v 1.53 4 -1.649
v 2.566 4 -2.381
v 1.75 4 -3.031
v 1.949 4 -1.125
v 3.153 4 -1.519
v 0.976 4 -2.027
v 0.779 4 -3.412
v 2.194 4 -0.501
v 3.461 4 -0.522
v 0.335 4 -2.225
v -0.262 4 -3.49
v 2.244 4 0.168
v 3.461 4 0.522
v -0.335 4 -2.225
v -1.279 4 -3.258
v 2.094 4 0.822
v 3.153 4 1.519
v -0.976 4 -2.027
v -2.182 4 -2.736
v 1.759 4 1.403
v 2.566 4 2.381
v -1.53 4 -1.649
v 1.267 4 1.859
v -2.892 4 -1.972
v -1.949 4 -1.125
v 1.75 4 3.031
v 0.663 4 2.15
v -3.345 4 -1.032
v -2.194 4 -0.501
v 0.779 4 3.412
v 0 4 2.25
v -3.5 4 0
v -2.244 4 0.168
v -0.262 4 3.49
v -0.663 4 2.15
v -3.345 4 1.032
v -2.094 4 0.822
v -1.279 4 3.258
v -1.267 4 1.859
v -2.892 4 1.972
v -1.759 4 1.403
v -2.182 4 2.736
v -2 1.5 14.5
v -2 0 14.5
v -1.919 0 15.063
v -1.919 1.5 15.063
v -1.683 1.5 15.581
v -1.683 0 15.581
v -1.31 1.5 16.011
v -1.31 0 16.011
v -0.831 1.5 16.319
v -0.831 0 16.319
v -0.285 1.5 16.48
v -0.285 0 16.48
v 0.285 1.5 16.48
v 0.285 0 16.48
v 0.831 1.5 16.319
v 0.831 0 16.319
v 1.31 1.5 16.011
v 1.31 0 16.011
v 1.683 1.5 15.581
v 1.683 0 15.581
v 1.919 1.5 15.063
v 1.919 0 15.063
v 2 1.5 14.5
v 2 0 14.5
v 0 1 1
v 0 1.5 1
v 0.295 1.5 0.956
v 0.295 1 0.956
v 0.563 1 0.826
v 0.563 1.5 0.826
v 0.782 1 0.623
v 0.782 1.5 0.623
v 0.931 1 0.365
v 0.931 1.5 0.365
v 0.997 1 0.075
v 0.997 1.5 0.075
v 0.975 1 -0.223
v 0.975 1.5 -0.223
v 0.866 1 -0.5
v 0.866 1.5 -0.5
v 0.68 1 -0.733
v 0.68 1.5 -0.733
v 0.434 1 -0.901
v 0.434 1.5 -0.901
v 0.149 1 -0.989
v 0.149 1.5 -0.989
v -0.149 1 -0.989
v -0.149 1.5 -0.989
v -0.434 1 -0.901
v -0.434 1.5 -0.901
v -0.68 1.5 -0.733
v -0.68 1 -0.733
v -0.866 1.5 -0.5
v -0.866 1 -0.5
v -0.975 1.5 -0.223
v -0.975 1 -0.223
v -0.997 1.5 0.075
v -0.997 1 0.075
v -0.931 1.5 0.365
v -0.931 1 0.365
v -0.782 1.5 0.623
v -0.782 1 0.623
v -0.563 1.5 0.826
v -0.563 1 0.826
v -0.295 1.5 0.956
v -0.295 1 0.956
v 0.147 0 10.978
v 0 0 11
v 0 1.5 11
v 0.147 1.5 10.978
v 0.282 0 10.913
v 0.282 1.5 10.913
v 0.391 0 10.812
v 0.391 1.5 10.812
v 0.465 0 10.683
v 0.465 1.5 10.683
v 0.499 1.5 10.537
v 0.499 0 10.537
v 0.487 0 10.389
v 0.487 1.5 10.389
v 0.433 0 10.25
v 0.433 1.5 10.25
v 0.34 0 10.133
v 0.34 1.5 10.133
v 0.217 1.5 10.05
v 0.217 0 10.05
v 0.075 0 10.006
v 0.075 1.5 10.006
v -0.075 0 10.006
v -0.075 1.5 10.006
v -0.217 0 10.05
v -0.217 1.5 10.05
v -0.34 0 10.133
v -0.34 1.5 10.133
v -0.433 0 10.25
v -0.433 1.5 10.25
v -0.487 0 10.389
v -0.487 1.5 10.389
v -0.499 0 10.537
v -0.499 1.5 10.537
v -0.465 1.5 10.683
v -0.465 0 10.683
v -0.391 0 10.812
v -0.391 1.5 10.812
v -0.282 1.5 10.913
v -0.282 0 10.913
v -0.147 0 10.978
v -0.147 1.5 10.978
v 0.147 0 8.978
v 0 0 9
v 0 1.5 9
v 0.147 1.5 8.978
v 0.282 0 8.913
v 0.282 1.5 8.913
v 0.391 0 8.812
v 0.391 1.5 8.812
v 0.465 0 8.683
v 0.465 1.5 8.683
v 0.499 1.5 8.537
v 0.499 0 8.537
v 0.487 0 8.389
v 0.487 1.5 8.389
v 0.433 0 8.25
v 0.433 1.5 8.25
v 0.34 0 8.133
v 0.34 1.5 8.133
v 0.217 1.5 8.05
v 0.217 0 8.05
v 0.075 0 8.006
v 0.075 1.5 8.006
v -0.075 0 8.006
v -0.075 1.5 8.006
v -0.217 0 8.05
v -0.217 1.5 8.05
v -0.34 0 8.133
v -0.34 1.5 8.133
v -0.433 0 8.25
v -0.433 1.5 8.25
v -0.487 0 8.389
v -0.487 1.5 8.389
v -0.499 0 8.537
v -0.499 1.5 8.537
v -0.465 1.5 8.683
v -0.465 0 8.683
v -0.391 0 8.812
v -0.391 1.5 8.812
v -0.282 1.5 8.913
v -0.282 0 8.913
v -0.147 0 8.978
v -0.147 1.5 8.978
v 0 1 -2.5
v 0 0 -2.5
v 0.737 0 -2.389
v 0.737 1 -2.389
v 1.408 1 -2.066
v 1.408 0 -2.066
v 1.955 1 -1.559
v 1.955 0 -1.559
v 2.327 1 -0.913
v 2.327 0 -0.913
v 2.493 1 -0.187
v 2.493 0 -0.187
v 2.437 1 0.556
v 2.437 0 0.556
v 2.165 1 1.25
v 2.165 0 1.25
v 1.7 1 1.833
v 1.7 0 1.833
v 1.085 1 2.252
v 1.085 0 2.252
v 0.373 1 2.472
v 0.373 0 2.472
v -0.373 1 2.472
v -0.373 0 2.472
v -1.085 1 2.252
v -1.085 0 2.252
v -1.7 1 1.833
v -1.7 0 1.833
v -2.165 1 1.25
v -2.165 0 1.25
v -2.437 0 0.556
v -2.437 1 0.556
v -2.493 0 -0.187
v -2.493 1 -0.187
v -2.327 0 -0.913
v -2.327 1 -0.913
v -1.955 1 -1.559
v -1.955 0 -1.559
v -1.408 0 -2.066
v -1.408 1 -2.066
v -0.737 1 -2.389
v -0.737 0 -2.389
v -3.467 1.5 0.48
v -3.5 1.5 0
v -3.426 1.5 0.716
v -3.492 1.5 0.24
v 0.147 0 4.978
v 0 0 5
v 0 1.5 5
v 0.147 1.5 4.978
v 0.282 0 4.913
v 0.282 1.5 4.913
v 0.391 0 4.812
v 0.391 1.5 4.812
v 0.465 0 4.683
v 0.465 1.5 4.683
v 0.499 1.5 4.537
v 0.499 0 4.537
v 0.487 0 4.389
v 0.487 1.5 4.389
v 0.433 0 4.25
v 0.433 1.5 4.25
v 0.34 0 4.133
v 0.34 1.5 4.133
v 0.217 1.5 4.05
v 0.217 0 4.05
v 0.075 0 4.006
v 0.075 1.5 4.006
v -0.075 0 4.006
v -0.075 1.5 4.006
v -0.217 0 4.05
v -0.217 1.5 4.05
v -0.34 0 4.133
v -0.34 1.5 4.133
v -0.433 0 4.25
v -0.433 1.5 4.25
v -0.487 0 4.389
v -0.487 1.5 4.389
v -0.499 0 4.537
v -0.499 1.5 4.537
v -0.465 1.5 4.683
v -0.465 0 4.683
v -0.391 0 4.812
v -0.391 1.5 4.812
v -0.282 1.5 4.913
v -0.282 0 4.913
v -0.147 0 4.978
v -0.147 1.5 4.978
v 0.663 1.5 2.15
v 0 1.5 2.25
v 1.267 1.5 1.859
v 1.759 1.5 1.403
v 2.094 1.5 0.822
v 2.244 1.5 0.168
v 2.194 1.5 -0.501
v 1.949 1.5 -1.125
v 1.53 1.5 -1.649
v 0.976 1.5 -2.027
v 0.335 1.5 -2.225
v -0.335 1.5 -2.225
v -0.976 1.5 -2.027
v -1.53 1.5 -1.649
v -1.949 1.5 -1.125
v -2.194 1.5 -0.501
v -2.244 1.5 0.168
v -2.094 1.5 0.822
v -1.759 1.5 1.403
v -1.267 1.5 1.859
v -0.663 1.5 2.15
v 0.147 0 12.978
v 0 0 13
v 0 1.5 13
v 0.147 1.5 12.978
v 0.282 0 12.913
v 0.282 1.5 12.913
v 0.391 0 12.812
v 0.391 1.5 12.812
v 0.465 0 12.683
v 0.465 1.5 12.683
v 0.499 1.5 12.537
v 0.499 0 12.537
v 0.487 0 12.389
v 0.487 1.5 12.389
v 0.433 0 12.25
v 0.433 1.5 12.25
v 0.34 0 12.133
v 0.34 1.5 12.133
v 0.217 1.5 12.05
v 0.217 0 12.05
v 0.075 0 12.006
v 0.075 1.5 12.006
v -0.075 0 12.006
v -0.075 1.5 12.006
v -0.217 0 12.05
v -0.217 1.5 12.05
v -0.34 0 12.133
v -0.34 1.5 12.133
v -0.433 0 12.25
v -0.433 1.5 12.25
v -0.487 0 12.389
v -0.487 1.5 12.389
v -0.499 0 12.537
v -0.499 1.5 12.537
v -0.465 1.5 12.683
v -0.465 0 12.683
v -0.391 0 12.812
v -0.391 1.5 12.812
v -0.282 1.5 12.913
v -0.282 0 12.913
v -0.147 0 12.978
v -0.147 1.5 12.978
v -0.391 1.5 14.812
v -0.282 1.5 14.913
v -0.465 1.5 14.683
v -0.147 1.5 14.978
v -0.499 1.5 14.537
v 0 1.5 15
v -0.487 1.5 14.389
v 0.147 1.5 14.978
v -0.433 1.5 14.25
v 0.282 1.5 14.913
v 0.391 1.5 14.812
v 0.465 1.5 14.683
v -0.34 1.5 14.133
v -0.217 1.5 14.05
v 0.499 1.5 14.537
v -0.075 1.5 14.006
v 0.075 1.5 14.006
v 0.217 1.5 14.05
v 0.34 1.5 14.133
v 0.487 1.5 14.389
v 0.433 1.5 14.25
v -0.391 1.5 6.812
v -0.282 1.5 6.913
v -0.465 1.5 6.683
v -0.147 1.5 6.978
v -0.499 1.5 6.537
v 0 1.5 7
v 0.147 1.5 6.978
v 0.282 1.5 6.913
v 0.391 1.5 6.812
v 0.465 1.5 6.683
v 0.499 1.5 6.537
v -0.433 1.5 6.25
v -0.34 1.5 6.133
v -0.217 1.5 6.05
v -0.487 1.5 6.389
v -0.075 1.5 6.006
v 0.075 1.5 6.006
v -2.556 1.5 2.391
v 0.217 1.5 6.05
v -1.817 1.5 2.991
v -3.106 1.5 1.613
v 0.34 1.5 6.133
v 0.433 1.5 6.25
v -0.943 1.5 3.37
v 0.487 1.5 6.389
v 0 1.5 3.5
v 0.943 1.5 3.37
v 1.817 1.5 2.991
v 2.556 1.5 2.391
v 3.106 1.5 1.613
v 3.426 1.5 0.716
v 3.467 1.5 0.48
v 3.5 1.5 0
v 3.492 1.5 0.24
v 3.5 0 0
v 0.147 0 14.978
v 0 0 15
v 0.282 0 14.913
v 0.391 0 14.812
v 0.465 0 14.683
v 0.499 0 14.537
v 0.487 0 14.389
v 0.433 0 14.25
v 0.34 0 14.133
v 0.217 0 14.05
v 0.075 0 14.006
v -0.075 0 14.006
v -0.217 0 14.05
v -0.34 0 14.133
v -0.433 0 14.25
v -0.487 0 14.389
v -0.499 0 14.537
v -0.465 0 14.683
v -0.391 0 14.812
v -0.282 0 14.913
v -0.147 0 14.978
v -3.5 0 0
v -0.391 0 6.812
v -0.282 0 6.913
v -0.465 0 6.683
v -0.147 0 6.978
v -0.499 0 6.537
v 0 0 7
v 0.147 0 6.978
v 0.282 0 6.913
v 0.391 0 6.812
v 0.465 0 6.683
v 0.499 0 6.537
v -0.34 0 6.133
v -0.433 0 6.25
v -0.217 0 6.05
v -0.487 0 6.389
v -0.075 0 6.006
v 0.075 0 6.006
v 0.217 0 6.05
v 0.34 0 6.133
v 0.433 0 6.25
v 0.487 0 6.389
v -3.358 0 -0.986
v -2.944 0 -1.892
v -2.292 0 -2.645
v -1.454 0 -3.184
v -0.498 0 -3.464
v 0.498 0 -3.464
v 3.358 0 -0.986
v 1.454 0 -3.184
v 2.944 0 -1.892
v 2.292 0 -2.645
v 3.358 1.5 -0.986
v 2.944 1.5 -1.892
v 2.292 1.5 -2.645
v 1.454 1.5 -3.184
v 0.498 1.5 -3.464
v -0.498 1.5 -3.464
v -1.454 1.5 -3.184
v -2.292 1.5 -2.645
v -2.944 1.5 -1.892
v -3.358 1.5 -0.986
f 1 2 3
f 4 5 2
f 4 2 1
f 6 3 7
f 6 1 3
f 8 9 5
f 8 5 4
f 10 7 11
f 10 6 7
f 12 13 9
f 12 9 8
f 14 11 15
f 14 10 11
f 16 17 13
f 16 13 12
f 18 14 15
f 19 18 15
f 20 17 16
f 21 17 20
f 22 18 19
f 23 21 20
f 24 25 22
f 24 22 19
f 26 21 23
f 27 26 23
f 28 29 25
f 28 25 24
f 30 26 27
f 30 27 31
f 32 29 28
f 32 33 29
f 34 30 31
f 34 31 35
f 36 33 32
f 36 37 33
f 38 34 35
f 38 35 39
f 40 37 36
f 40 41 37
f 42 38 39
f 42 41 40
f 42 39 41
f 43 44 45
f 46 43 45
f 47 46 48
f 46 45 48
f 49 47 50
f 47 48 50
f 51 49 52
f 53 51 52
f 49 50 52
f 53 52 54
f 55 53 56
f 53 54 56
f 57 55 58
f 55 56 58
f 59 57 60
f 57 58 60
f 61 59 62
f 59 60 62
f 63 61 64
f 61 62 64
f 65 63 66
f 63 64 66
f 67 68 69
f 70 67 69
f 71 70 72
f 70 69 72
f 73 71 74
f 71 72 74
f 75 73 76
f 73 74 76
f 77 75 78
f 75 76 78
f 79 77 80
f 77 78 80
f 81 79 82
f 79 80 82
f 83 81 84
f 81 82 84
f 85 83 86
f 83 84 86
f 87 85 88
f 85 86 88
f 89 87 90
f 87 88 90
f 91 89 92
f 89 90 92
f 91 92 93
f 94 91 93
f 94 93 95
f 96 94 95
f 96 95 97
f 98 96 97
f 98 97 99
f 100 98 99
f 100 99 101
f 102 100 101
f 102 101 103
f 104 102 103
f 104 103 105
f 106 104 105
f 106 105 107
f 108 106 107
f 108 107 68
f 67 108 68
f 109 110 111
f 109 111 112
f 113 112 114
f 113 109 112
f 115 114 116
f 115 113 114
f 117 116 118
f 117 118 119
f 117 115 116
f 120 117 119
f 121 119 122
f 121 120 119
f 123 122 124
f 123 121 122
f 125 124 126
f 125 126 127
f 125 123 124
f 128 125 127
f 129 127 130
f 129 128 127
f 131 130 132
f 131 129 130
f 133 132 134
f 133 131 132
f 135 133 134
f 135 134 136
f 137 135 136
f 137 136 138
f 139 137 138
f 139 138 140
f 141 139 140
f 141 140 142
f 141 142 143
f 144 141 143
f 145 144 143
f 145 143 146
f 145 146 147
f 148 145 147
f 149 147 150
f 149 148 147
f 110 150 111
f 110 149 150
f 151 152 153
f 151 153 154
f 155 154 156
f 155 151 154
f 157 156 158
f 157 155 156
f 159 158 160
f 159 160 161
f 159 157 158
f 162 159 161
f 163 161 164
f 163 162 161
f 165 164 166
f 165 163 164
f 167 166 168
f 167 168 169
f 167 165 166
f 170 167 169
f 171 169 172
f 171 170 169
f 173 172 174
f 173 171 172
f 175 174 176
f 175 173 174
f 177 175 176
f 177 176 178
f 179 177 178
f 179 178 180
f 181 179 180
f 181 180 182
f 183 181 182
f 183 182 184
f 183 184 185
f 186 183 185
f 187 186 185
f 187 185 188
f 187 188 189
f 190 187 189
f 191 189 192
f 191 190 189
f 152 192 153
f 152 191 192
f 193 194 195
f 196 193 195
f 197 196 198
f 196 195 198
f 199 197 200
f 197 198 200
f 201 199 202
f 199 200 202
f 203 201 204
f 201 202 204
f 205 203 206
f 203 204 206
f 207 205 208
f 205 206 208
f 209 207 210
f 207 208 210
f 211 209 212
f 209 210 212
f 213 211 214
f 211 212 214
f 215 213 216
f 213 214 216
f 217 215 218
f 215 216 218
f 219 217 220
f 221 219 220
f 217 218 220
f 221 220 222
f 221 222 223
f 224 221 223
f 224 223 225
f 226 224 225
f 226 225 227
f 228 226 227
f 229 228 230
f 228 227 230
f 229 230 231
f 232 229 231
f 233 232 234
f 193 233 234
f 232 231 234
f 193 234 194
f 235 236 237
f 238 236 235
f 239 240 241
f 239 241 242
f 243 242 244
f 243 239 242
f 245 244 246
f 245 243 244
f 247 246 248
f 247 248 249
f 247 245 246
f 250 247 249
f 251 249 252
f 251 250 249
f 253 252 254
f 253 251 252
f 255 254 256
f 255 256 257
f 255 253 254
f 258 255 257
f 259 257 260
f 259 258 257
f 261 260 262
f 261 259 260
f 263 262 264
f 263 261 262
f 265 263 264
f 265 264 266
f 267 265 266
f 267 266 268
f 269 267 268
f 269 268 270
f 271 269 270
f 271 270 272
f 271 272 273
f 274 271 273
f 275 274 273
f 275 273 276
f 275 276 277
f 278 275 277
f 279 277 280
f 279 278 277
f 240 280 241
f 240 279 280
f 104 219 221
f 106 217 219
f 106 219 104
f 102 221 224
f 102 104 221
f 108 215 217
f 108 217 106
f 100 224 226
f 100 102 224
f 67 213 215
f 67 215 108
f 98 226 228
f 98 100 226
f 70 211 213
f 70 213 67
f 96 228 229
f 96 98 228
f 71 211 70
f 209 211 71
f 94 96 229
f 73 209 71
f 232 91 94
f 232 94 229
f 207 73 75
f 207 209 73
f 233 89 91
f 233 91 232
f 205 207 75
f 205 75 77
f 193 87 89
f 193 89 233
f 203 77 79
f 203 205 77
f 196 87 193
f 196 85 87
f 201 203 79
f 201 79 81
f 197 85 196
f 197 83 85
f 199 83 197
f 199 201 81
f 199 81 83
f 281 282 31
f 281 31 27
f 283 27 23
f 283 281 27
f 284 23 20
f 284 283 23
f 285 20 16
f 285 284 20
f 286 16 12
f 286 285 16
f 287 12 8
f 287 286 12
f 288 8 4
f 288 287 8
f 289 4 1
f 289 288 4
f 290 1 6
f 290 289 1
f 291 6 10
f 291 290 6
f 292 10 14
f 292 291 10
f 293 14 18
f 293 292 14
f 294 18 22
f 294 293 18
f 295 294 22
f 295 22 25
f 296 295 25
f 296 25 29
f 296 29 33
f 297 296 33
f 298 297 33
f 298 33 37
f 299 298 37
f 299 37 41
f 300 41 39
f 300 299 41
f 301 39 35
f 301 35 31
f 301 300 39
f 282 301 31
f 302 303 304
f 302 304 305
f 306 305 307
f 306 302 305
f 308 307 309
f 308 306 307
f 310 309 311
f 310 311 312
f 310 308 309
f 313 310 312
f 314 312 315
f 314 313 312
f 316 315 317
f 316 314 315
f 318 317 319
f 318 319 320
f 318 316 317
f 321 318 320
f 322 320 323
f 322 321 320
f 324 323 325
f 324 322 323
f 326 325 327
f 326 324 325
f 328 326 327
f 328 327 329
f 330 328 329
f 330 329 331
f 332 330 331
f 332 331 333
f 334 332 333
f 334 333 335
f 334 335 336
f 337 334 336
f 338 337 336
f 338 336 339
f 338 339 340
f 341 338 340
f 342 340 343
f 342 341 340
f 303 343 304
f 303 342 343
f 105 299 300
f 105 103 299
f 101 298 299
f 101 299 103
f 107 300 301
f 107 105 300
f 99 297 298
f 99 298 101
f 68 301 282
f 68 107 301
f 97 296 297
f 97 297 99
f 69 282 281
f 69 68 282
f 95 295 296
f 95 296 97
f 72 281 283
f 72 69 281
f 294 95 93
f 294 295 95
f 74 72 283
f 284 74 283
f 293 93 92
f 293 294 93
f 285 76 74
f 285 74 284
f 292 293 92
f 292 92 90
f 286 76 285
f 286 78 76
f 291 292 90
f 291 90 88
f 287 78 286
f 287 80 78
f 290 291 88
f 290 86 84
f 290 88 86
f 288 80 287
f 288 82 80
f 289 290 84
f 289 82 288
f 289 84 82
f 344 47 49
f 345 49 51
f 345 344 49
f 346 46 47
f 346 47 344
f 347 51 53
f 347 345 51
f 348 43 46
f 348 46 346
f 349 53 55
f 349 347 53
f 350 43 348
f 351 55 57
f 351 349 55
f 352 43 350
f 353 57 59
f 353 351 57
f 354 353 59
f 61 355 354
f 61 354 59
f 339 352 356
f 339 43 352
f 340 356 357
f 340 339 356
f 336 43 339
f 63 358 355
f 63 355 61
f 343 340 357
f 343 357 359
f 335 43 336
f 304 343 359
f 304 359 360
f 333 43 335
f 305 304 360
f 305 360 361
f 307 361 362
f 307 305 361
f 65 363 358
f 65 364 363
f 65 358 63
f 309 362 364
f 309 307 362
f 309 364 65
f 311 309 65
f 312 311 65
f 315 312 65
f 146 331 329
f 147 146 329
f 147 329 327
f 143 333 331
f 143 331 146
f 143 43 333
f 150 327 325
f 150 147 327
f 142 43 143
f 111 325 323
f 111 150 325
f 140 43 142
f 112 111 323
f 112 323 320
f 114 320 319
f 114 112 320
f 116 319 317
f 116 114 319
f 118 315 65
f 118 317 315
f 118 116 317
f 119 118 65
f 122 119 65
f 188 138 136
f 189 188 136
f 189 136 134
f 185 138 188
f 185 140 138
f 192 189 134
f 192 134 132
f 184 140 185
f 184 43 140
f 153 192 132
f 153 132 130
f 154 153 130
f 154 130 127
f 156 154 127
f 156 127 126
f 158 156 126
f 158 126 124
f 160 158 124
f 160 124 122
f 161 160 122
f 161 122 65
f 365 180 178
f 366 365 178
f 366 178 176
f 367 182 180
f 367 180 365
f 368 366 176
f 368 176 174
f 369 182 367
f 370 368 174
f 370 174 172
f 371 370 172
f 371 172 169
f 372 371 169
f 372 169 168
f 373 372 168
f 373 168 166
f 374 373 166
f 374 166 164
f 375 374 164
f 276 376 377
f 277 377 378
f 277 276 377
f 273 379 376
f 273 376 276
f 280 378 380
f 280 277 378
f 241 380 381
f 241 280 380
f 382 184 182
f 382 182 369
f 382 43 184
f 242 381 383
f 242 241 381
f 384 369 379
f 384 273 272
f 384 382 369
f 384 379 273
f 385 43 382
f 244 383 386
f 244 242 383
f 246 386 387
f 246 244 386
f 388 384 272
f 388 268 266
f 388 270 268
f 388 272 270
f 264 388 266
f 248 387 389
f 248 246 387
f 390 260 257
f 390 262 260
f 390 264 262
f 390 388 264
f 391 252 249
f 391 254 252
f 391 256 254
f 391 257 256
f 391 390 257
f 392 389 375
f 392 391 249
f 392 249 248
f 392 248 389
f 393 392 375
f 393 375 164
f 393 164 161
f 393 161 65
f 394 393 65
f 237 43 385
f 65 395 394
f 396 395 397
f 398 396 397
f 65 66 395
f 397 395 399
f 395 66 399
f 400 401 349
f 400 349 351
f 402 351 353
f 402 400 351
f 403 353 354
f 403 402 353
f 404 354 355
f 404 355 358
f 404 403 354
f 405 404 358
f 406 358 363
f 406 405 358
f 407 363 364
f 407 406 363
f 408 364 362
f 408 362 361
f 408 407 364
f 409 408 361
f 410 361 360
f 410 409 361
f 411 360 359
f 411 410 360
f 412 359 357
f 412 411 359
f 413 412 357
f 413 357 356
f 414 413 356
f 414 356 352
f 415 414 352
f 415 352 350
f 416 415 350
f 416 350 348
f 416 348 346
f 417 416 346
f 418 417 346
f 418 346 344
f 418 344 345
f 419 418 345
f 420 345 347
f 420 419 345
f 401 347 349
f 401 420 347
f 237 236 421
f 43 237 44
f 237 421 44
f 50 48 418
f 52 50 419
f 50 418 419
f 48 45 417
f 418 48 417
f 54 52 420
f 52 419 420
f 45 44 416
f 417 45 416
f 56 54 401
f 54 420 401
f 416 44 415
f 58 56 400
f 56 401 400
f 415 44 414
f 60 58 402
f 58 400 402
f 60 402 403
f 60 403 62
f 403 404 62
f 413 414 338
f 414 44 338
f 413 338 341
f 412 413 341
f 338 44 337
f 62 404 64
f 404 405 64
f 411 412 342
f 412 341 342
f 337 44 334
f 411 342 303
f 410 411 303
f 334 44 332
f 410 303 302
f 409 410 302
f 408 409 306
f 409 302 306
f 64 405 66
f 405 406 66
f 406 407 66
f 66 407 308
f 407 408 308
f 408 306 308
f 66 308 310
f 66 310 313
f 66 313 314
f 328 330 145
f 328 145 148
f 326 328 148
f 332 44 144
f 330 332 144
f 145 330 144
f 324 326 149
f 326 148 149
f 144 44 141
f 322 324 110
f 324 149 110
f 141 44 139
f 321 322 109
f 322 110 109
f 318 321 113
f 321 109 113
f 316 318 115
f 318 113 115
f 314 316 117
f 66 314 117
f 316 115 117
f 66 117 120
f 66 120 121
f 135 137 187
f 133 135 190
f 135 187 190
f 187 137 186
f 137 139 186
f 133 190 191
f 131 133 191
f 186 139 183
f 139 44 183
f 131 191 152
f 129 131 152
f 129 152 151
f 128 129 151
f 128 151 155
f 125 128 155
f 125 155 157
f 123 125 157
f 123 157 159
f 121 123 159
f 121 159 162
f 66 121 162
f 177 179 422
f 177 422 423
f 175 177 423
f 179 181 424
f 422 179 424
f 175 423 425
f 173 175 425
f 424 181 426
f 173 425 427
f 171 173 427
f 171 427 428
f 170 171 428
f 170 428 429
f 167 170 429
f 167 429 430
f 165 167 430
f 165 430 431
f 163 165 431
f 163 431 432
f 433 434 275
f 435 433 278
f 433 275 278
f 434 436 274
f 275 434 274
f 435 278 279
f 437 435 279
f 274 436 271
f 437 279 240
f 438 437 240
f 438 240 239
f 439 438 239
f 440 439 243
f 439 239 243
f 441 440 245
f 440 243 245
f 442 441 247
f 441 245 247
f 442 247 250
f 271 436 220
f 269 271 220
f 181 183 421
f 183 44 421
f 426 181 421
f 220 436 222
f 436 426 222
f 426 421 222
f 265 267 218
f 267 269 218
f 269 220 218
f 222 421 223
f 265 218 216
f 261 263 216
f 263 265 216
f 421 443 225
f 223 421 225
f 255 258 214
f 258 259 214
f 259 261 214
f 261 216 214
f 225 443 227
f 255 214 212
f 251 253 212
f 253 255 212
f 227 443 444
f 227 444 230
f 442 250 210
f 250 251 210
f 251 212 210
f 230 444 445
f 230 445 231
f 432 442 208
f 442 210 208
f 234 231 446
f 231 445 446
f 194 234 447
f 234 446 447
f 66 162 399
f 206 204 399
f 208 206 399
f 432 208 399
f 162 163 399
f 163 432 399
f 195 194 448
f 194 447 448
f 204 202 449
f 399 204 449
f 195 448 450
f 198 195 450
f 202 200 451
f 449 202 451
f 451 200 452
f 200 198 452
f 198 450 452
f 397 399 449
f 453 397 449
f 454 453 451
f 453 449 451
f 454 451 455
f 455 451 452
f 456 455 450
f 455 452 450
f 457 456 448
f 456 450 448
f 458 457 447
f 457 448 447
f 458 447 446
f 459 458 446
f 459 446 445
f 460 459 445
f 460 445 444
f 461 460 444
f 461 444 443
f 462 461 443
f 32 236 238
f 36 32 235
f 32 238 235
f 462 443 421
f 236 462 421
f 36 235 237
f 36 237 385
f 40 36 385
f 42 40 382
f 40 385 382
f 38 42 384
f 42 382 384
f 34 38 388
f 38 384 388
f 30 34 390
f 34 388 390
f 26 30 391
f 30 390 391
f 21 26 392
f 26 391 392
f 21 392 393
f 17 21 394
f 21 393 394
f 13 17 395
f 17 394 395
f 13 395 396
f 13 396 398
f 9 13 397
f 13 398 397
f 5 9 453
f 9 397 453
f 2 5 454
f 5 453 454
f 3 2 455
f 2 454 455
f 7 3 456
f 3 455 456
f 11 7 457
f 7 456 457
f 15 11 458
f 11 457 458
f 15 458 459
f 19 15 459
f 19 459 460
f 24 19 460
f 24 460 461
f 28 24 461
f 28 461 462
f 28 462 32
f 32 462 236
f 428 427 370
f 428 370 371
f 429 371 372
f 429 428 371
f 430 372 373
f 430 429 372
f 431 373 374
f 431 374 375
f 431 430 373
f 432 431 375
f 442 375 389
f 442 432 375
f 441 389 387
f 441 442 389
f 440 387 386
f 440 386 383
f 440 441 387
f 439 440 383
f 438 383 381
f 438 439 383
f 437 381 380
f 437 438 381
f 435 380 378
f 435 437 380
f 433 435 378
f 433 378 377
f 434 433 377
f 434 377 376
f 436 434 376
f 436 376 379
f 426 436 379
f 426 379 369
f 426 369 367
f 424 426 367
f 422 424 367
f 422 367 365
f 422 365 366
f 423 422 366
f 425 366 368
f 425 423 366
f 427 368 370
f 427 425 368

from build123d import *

# Parameters (mm, degrees)
CROQUIS1_R              = 0.5
SALIENTE_EXTRUIR1_DEPTH = 1.5
CROQUIS2_R              = 3.5
CROQUIS2_R_2            = 2.25
SALIENTE_EXTRUIR2_DEPTH = 2.5
CROQUIS3_R              = 2.5
CORTAR_EXTRUIR1_DEPTH   = 1
CROQUIS4_R              = 1
CORTAR_EXTRUIR2_DEPTH   = 1


with BuildPart() as part:
    # Croquis1 → Saliente-Extruir1 (new body)
    with BuildSketch(Plane(origin=(0, 0, 0), x_dir=(1, 0, 0), z_dir=(0, 1, 0))):
        with BuildLine():
            Line((-3.5, 0), (-2, -14.5))
            ThreePointArc((-2, -14.5), (0, -16.5), (2, -14.5))
            Line((2, -14.5), (3.5, 0))
            ThreePointArc((3.5, 0), (0, 3.5), (-3.5, 0))
        make_face()
        with Locations(Location((0, -14.5, 0), (0, 0, 270))):
            Circle(CROQUIS1_R, mode=Mode.SUBTRACT)
        with Locations(Location((0, -12.5, 0), (0, 0, 270))):
            Circle(CROQUIS1_R, mode=Mode.SUBTRACT)
        with Locations(Location((0, -10.5, 0), (0, 0, 270))):
            Circle(CROQUIS1_R, mode=Mode.SUBTRACT)
        with Locations(Location((0, -8.5, 0), (0, 0, 270))):
            Circle(CROQUIS1_R, mode=Mode.SUBTRACT)
        with Locations(Location((0, -6.5, 0), (0, 0, 270))):
            Circle(CROQUIS1_R, mode=Mode.SUBTRACT)
        with Locations(Location((0, -4.5, 0), (0, 0, 270))):
            Circle(CROQUIS1_R, mode=Mode.SUBTRACT)
    extrude(amount=SALIENTE_EXTRUIR1_DEPTH)

    # Croquis2 → Saliente-Extruir2 (add)
    with BuildSketch(Plane(origin=(0, 1.5, 0), x_dir=(1, 0, 0), z_dir=(0, 1, 0))):
        with Locations(Location((0, 0, 0), (0, 0, 180))):
            Circle(CROQUIS2_R)
        with Locations(Location((0, 0, 0), (0, 0, 270))):
            Circle(CROQUIS2_R_2, mode=Mode.SUBTRACT)
    extrude(amount=SALIENTE_EXTRUIR2_DEPTH)

    # Croquis3 → Cortar-Extruir1 (cut)
    with BuildSketch(Plane.XZ):
        with Locations(Location((0, 0, 0), (0, 0, 270))):
            Circle(CROQUIS3_R)
    extrude(amount=-CORTAR_EXTRUIR1_DEPTH, mode=Mode.SUBTRACT)

    # Croquis4 → Cortar-Extruir2 (cut)
    with BuildSketch(Plane(origin=(0, 1.5, 0), x_dir=(1, 0, 0), z_dir=(0, 1, 0))):
        with Locations(Location((0, 0, 0), (0, 0, 270))):
            Circle(CROQUIS4_R)
    extrude(amount=-CORTAR_EXTRUIR2_DEPTH, mode=Mode.SUBTRACT)


solid = part.part
